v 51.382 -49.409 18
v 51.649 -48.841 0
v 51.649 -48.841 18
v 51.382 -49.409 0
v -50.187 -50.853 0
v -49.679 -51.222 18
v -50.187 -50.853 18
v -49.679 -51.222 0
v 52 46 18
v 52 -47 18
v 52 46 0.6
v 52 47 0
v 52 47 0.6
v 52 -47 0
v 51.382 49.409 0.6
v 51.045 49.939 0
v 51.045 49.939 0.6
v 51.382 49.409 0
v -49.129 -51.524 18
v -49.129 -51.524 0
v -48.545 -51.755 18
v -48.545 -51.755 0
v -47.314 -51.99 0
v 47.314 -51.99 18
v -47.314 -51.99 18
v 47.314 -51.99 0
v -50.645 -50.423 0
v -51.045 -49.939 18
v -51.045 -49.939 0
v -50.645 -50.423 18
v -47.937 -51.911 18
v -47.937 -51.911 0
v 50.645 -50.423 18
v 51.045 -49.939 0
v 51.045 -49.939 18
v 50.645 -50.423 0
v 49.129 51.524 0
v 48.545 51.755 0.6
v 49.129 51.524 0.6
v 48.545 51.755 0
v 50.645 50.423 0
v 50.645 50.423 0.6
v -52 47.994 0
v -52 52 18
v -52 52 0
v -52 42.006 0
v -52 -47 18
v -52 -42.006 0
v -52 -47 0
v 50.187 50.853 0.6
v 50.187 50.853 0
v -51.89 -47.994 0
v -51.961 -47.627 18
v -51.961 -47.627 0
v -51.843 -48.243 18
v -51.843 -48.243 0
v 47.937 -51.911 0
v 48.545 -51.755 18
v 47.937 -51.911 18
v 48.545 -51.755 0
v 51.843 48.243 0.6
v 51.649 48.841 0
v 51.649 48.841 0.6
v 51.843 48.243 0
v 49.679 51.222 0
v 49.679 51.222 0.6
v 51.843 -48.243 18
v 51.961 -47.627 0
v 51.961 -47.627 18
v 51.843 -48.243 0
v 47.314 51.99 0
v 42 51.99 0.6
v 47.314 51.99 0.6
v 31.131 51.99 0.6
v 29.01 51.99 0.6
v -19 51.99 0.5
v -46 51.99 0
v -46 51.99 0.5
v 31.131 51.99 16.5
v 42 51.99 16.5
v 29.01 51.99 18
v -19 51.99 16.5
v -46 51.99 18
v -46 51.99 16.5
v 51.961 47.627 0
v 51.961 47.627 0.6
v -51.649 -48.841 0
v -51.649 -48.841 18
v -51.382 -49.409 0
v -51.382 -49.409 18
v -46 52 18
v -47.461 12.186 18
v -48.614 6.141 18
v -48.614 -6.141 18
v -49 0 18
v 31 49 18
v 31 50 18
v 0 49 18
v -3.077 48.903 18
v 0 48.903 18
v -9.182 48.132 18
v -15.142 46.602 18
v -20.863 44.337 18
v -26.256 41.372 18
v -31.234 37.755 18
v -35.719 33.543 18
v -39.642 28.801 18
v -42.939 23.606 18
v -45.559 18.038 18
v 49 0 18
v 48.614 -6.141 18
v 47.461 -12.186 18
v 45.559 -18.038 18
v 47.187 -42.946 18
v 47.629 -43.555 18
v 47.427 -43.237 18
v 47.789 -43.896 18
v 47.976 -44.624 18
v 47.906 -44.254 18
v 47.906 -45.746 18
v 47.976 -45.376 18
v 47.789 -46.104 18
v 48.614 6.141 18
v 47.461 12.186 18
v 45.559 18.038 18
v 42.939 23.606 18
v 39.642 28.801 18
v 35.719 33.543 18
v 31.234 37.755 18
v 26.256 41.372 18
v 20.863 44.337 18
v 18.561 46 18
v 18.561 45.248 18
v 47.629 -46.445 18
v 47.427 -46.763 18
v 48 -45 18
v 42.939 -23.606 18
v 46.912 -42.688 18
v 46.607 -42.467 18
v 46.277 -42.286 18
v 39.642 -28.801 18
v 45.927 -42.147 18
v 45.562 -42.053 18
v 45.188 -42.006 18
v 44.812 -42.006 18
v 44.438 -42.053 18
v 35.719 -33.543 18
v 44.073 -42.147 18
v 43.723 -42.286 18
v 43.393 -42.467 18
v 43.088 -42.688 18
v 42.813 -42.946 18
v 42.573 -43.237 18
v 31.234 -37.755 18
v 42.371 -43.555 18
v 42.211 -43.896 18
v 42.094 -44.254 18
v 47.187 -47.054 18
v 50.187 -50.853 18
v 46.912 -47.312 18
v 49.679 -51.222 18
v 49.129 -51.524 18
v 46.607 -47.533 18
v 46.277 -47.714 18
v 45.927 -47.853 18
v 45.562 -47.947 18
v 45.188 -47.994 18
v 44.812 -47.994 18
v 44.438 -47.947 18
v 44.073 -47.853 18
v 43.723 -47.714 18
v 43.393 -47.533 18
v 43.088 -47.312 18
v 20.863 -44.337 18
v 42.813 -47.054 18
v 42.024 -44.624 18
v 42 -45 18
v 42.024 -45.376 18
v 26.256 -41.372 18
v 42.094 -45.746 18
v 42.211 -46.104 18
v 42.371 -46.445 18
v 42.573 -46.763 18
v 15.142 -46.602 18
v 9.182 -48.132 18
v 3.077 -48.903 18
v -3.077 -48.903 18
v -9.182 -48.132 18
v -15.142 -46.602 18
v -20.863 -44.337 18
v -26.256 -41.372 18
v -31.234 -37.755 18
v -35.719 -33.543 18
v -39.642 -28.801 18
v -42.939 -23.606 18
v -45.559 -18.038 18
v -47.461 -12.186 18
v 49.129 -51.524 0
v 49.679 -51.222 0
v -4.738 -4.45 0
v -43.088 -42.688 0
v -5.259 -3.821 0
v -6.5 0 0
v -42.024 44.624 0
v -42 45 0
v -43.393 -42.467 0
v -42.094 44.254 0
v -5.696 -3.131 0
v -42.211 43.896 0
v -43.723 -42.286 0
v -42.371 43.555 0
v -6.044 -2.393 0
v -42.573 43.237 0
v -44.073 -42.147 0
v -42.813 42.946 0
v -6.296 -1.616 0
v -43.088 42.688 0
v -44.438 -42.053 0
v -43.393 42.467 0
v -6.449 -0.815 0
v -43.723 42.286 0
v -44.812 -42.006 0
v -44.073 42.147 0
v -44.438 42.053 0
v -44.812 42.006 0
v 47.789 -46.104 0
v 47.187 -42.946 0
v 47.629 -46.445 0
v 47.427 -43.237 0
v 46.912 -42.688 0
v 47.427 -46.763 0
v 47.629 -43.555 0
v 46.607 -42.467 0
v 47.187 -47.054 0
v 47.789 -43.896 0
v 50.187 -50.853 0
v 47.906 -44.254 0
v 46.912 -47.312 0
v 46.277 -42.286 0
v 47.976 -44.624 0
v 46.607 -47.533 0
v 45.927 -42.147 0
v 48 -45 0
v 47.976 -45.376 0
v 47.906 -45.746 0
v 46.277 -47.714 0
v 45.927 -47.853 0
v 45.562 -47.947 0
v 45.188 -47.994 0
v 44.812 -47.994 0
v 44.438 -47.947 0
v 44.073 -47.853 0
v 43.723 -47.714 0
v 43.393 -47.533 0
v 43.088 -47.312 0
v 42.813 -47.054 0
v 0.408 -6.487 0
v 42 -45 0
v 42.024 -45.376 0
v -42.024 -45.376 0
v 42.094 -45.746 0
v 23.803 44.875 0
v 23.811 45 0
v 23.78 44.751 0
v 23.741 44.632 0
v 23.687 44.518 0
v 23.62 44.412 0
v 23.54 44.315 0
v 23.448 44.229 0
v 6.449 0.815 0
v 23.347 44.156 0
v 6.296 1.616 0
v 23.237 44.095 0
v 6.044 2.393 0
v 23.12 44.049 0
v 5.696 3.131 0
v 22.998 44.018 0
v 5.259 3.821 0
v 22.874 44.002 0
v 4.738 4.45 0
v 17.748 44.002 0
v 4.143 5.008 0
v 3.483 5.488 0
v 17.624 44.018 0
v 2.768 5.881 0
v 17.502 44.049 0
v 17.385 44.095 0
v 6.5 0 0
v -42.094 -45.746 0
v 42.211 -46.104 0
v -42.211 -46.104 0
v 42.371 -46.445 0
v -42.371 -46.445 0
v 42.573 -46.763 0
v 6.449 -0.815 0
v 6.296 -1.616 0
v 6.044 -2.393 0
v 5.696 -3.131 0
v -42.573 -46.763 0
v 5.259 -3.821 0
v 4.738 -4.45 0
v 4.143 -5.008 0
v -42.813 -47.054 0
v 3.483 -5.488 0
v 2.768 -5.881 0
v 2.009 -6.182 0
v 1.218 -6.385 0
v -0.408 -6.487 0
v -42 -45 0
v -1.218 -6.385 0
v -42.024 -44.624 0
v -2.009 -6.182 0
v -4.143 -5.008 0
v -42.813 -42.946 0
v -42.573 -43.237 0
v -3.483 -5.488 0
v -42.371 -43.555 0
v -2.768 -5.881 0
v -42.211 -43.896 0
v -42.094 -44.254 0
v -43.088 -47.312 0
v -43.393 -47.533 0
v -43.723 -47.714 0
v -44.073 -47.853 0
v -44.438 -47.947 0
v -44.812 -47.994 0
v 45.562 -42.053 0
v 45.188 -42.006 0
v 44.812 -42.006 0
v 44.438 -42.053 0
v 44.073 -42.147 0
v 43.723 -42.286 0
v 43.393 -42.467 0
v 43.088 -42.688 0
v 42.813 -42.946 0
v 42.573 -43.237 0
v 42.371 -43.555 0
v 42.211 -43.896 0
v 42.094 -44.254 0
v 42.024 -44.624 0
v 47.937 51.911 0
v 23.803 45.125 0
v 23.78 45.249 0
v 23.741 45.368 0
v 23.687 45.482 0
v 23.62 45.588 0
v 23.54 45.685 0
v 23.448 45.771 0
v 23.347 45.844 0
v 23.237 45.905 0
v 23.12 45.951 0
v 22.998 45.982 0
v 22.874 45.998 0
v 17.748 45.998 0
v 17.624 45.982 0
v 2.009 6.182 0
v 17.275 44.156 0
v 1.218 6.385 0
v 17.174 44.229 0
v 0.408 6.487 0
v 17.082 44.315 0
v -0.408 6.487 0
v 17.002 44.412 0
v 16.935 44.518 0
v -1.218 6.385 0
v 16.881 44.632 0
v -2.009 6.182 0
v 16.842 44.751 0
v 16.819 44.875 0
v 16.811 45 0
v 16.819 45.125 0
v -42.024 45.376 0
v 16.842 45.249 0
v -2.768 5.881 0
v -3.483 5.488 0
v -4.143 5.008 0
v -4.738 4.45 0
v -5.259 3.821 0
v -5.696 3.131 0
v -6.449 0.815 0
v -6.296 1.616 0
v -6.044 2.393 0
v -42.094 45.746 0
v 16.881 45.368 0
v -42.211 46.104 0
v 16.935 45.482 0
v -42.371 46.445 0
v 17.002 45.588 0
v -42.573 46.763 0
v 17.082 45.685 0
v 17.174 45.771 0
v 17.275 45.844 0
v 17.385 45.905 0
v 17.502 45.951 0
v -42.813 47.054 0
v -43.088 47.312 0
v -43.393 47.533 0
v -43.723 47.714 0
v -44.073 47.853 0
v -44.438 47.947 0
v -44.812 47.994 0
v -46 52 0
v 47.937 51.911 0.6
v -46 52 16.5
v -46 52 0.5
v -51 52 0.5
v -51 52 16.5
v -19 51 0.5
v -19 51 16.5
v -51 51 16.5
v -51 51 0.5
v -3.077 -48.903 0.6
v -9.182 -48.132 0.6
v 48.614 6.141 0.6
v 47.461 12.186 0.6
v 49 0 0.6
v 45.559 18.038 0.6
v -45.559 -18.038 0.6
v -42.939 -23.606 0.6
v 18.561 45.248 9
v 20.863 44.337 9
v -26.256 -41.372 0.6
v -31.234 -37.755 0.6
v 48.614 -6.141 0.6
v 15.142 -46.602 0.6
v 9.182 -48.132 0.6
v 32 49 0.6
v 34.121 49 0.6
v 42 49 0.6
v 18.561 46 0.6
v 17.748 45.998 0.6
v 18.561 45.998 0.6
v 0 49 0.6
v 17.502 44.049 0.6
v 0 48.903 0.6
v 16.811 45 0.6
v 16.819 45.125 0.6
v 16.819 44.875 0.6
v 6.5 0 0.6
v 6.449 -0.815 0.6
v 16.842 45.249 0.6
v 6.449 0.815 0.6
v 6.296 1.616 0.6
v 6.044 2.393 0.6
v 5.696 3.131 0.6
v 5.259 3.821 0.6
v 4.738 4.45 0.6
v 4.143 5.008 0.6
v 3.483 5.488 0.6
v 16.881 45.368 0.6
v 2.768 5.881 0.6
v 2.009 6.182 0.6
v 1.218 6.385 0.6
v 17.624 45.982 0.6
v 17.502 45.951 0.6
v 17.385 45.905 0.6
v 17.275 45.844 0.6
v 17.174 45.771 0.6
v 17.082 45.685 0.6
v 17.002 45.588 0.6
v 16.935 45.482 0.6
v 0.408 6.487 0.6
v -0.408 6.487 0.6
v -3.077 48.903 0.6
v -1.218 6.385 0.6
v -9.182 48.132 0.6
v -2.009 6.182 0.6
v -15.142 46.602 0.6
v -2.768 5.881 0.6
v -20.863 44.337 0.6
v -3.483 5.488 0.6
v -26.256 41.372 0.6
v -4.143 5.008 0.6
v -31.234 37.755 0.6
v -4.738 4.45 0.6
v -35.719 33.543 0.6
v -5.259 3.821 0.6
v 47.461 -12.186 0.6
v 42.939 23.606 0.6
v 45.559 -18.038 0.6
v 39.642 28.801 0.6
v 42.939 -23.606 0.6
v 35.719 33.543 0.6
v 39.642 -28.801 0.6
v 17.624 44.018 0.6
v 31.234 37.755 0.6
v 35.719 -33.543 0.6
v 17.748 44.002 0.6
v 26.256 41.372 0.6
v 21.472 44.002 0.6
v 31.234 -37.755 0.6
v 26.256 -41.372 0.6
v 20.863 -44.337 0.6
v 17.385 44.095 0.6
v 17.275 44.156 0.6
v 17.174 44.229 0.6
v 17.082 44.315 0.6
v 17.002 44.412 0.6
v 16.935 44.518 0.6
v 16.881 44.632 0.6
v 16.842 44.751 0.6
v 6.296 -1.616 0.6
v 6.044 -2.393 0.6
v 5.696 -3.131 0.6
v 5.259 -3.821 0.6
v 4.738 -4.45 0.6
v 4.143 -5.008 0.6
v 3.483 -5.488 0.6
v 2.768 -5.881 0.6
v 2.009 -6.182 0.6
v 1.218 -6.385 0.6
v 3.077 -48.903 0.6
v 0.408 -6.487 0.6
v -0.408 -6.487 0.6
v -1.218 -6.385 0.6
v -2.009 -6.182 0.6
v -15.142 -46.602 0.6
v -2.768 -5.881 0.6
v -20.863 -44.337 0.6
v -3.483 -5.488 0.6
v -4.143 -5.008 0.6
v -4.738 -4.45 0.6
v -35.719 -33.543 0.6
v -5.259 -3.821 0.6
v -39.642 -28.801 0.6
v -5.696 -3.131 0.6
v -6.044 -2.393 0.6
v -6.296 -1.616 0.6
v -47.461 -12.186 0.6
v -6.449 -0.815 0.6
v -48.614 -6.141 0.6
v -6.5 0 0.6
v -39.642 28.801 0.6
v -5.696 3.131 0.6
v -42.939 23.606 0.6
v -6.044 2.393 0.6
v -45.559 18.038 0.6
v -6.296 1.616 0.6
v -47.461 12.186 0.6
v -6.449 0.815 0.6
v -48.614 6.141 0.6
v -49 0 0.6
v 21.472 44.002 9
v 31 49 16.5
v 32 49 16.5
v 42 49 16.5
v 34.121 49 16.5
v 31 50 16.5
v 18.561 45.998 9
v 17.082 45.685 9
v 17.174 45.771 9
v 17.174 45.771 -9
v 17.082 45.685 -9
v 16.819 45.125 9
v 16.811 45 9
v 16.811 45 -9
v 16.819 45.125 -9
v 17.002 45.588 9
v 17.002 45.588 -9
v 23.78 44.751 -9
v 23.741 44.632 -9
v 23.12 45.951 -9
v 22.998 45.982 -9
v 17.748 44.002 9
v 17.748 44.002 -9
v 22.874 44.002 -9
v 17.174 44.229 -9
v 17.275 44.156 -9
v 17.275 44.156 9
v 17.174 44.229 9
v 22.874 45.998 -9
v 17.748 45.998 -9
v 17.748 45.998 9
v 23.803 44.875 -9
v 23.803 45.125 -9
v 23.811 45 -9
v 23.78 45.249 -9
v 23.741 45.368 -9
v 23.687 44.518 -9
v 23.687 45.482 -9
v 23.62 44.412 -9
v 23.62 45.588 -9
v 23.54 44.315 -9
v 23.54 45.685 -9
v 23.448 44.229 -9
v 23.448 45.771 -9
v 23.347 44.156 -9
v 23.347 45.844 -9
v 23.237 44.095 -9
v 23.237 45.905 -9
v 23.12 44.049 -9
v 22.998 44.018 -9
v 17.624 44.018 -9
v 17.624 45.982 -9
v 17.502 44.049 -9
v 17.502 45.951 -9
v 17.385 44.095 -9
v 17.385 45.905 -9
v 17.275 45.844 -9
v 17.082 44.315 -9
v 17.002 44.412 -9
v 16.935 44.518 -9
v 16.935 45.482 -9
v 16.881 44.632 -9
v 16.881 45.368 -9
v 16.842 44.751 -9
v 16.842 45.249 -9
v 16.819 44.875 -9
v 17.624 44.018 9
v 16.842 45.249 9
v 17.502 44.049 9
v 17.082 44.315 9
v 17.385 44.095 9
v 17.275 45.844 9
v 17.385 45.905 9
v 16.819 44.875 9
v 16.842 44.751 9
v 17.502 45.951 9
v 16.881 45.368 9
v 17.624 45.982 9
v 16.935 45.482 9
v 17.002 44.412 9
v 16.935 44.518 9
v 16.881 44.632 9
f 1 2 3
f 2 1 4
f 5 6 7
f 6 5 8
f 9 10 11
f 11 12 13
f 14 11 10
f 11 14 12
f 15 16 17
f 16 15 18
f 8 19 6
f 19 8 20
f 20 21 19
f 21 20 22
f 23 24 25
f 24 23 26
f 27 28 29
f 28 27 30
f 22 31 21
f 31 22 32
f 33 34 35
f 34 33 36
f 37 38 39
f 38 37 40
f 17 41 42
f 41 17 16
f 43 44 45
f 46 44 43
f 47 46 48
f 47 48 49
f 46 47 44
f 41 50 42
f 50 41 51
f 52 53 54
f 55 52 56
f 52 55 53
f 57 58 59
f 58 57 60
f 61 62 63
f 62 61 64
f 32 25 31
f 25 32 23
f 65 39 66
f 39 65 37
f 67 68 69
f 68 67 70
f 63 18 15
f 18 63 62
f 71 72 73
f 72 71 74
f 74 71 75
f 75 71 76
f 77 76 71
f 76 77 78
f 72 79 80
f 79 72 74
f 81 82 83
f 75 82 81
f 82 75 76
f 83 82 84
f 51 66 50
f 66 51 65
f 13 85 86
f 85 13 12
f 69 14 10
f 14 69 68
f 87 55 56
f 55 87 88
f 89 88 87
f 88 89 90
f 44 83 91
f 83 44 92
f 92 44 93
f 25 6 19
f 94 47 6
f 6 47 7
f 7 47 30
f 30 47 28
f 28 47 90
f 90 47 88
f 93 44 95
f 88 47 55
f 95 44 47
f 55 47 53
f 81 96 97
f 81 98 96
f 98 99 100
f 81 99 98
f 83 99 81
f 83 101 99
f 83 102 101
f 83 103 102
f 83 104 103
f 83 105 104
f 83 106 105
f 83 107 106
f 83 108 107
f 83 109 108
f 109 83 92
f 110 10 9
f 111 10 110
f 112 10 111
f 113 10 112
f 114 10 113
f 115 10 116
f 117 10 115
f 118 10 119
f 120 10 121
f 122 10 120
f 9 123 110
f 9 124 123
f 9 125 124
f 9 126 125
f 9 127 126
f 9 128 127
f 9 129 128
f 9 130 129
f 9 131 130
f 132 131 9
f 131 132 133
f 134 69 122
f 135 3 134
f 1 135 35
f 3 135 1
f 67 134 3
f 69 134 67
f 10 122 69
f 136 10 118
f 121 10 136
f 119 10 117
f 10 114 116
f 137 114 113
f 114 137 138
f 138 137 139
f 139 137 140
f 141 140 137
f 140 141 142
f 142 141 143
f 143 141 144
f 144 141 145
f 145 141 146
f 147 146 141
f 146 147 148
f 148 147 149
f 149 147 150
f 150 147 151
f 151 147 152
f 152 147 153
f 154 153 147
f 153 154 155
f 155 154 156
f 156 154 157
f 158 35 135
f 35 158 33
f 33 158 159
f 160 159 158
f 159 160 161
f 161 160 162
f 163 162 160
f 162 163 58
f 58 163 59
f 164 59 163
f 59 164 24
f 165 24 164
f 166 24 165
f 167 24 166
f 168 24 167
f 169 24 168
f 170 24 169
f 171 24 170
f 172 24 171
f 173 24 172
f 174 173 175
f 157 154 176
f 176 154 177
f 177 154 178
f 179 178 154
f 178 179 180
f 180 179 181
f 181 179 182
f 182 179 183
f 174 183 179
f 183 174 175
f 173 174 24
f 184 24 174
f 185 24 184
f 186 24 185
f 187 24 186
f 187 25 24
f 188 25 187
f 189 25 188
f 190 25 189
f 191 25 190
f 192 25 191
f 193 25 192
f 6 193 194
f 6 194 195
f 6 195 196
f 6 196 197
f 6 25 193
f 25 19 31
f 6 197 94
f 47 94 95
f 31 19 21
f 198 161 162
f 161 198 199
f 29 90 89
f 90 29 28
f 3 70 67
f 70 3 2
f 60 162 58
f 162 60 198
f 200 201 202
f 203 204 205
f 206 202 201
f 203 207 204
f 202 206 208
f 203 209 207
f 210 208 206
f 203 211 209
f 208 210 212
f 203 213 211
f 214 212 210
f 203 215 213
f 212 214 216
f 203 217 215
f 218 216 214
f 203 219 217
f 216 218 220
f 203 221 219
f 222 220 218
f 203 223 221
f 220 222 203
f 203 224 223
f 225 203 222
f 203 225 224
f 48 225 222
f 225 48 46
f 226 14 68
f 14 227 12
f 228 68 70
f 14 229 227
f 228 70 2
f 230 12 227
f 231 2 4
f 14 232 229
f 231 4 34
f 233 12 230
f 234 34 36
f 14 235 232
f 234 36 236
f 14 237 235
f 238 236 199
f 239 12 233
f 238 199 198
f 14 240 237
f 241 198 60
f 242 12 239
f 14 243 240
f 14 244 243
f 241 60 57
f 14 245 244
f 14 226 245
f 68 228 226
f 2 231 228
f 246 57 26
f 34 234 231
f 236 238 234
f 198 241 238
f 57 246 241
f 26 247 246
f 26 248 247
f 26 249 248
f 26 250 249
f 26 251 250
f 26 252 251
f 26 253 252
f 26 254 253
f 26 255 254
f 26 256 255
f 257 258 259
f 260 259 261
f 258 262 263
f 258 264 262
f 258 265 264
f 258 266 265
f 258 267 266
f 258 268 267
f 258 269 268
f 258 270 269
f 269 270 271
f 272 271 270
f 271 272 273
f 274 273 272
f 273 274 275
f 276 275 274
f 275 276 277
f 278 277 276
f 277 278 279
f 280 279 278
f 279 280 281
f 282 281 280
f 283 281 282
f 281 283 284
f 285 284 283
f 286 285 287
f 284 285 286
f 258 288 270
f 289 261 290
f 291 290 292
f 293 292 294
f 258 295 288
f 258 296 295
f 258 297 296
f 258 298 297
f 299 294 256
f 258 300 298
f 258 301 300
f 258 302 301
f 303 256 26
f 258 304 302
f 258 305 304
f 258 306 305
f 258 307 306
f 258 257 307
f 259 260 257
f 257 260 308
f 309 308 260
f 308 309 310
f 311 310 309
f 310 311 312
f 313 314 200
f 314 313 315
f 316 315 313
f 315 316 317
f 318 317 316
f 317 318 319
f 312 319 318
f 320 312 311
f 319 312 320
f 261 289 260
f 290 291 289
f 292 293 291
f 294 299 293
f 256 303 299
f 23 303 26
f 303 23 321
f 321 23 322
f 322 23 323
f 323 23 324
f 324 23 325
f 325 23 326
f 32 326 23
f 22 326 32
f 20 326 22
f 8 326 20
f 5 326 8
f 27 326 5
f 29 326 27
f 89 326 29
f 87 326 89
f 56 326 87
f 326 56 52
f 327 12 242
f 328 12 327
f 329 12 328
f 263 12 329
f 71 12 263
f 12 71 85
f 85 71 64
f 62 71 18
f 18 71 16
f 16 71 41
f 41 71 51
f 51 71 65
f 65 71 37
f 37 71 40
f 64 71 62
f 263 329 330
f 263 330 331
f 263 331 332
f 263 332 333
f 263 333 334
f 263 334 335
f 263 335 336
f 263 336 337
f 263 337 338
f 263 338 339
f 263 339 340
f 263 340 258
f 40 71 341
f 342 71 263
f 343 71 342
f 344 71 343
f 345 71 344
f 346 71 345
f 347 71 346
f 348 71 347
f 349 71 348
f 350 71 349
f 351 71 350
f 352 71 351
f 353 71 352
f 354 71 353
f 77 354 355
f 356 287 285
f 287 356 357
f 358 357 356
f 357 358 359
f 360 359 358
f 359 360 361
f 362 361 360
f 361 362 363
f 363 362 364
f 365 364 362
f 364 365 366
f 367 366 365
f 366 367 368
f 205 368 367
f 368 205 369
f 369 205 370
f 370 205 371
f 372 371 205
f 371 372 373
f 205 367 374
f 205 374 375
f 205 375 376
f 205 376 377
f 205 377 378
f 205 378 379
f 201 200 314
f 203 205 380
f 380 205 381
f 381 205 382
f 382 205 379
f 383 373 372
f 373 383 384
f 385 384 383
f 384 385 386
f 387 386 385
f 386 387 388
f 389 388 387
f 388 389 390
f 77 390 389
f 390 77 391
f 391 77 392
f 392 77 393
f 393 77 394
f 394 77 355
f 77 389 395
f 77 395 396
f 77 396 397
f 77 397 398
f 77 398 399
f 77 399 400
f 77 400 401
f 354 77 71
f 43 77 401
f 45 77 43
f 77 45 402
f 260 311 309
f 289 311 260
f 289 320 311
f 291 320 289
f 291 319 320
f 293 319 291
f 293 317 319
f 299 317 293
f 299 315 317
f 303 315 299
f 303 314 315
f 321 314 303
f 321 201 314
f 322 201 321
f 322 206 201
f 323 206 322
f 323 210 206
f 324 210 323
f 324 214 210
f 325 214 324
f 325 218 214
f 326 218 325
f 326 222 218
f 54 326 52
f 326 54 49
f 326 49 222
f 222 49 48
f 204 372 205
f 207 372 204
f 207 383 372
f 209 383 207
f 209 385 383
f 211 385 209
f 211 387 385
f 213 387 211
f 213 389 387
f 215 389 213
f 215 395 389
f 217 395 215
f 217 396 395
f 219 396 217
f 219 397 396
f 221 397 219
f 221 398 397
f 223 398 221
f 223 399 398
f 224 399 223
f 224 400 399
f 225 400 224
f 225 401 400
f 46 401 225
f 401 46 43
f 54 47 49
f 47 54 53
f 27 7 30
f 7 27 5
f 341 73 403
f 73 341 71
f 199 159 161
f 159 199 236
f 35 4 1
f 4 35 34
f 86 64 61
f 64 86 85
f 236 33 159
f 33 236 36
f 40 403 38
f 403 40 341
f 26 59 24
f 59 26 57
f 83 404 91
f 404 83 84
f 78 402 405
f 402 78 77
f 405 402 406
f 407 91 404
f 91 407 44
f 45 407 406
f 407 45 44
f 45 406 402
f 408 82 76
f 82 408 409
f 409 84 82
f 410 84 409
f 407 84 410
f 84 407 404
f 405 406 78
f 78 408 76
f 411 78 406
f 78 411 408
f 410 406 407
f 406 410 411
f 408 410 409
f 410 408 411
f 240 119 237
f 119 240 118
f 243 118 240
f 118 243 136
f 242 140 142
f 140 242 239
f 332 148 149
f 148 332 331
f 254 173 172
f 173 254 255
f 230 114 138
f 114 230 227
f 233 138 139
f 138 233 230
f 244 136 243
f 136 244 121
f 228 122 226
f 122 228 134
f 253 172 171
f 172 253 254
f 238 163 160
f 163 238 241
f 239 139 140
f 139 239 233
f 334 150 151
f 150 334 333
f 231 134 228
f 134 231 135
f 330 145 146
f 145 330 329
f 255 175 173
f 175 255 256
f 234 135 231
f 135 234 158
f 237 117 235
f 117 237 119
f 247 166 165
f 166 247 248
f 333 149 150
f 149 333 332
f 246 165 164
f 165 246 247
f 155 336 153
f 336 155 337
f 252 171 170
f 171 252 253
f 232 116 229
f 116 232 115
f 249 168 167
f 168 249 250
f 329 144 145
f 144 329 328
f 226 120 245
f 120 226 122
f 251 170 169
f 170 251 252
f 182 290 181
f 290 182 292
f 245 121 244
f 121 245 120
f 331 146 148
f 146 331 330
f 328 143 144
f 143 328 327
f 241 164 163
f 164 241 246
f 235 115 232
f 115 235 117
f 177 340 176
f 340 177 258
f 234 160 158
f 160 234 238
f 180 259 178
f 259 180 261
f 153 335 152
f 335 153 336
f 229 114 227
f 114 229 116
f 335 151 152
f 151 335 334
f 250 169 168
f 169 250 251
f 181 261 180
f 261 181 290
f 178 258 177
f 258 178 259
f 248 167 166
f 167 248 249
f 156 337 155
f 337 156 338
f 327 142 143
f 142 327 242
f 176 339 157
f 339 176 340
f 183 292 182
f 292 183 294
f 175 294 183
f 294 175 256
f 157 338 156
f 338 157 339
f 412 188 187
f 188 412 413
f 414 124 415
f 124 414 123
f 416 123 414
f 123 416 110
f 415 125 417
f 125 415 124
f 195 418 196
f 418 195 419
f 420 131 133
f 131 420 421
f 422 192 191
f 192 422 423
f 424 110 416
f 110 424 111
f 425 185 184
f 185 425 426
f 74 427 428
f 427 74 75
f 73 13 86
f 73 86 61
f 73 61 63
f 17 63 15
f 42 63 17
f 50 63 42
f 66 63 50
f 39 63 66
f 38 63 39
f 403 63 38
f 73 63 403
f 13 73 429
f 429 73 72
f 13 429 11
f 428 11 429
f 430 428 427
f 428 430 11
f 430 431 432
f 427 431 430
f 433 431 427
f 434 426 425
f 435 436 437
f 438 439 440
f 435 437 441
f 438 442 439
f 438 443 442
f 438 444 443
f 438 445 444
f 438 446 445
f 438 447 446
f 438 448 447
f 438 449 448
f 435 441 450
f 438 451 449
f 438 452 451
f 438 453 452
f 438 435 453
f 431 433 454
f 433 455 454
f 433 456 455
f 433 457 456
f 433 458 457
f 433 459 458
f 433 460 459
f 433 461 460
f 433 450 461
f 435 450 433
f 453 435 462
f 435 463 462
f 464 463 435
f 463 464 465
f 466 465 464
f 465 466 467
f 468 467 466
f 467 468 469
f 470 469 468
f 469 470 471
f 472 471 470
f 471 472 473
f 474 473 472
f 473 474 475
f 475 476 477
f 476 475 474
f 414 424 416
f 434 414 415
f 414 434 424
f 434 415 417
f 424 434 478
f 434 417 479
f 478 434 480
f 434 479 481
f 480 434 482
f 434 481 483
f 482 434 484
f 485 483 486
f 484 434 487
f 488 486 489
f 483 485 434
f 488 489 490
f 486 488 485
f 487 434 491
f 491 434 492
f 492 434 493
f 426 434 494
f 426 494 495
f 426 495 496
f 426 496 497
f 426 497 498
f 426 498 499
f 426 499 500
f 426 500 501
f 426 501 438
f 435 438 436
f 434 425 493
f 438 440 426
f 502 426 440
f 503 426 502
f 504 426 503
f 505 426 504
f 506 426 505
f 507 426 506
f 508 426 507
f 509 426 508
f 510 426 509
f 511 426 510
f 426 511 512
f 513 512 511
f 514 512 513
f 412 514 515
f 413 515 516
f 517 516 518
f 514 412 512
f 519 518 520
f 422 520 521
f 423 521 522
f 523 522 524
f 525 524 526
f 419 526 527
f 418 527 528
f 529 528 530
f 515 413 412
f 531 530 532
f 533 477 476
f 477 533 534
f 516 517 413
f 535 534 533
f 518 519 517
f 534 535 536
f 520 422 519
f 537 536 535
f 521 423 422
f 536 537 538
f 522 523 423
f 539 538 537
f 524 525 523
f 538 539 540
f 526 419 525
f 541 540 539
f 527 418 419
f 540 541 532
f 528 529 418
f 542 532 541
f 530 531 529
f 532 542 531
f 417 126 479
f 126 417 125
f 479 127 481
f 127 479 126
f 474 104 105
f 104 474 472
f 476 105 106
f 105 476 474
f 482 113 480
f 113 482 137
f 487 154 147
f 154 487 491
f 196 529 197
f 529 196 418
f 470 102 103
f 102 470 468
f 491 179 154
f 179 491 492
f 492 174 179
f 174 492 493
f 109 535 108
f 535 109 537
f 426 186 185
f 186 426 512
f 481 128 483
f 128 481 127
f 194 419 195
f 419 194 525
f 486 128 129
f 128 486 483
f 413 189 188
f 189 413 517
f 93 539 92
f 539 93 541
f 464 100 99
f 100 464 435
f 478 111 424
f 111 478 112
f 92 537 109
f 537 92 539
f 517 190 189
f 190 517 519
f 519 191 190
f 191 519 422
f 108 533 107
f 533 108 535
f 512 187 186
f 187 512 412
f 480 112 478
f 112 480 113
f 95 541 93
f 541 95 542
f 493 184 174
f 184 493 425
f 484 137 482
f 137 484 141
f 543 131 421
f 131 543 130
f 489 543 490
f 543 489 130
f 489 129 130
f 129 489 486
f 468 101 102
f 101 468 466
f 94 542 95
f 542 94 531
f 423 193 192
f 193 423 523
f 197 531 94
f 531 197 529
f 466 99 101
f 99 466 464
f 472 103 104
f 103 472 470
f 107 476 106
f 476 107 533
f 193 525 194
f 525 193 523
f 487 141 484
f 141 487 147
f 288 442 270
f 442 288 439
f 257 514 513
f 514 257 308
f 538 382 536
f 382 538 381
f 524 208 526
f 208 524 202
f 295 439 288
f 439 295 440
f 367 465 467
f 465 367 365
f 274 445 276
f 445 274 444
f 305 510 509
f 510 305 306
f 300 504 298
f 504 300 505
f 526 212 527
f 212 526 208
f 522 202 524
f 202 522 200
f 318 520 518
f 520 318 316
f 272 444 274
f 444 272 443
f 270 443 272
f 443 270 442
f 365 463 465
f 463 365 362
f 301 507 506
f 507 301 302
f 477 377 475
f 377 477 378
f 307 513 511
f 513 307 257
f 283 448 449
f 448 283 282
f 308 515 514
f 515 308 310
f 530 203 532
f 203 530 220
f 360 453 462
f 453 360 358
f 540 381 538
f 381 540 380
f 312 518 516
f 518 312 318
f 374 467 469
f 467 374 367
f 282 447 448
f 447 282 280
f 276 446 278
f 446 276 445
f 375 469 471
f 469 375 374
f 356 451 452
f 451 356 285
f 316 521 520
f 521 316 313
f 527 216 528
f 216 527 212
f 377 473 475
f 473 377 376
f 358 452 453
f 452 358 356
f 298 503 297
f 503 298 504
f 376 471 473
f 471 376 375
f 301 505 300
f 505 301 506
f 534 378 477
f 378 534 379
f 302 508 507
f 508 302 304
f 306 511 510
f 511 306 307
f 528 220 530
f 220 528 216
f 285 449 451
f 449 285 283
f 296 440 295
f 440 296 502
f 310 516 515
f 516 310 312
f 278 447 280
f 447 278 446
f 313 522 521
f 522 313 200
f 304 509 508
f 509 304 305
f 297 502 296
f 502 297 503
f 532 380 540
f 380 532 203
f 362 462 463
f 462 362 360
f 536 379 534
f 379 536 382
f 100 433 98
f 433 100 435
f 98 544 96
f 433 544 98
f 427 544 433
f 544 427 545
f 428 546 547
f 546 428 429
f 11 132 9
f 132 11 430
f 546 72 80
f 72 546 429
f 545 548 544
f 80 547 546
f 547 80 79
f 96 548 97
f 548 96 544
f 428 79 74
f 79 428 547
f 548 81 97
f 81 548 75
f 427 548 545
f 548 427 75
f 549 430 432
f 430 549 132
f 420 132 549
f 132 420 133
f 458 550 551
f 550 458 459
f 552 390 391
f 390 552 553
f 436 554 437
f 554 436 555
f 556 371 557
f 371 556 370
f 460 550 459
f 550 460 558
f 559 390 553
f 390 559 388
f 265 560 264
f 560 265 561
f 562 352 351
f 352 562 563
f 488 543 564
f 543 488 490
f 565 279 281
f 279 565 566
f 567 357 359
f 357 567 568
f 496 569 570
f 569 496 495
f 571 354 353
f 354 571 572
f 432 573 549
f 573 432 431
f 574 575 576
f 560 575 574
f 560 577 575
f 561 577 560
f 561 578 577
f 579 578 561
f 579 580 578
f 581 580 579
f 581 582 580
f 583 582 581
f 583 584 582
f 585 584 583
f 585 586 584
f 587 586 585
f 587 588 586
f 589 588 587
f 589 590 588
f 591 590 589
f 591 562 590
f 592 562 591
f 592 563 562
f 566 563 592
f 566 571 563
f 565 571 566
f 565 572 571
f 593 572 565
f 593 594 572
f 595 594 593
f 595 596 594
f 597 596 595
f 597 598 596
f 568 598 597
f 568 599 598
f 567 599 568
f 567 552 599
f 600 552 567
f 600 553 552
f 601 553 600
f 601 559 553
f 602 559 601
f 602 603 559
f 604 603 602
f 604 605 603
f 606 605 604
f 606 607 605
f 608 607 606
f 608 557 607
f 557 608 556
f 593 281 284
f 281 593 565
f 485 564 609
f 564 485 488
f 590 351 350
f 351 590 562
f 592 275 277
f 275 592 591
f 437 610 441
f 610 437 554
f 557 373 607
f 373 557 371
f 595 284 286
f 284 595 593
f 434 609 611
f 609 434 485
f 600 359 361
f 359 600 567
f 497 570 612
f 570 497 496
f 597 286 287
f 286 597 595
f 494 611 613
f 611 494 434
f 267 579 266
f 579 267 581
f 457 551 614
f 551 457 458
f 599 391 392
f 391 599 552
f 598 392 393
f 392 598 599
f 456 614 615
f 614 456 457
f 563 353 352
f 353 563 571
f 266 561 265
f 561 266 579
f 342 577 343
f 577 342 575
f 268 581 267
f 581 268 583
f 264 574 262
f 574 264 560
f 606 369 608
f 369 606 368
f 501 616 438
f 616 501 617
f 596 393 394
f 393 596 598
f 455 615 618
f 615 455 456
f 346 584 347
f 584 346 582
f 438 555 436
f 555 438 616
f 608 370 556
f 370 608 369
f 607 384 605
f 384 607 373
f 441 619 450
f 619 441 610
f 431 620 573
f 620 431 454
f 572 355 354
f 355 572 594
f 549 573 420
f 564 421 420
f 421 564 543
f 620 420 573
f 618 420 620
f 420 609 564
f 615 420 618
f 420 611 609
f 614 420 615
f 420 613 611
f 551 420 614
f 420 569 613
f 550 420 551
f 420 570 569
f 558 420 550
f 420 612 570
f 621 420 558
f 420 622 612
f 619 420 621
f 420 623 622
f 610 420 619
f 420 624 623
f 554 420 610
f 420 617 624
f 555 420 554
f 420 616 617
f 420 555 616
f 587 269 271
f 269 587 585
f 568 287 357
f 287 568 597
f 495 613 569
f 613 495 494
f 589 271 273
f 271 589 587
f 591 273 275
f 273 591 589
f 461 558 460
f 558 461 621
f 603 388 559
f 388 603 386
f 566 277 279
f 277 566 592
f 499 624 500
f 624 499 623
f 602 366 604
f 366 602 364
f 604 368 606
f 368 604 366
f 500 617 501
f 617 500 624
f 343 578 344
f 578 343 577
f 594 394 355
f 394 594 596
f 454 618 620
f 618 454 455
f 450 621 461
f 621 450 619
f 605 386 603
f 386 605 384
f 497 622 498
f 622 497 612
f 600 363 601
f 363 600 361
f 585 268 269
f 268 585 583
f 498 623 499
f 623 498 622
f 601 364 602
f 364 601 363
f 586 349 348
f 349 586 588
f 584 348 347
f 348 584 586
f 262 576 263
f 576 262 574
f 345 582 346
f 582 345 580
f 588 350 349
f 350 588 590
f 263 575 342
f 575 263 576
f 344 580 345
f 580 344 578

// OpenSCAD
$fn = 50;


union() {
	difference() {
		union() {
			hull() {
				translate(v = [-47.0000000000, 47.0000000000, 0]) {
					cylinder(h = 18, r = 5);
				}
				translate(v = [47.0000000000, 47.0000000000, 0]) {
					cylinder(h = 18, r = 5);
				}
				translate(v = [-47.0000000000, -47.0000000000, 0]) {
					cylinder(h = 18, r = 5);
				}
				translate(v = [47.0000000000, -47.0000000000, 0]) {
					cylinder(h = 18, r = 5);
				}
			}
			translate(v = [-52.0000000000, 46.0000000000, 0]) {
				cube(size = [6, 6, 18]);
			}
		}
		union() {
			translate(v = [-52.5000000000, -45.0000000000, -250.0000000000]) {
				rotate(a = [0, 0, 0]) {
					difference() {
						union() {
							hull() {
								translate(v = [7.5000000000, 0, 0]) {
									cylinder(h = 250, r = 3.0000000000, r1 = 3.0000000000, r2 = 3.0000000000);
								}
								translate(v = [-7.5000000000, 0, 0]) {
									cylinder(h = 250, r = 3.0000000000, r1 = 3.0000000000, r2 = 3.0000000000);
								}
							}
						}
						union();
					}
				}
			}
			translate(v = [-52.5000000000, 45.0000000000, -250.0000000000]) {
				rotate(a = [0, 0, 0]) {
					difference() {
						union() {
							hull() {
								translate(v = [7.5000000000, 0, 0]) {
									cylinder(h = 250, r = 3.0000000000, r1 = 3.0000000000, r2 = 3.0000000000);
								}
								translate(v = [-7.5000000000, 0, 0]) {
									cylinder(h = 250, r = 3.0000000000, r1 = 3.0000000000, r2 = 3.0000000000);
								}
							}
						}
						union();
					}
				}
			}
			translate(v = [-51.0000000000, 51.0000000000, 0.5000000000]) {
				cube(size = [32, 1, 16]);
			}
			translate(v = [45.0000000000, -45.0000000000, 0]) {
				cylinder(h = 100, r = 3.0000000000);
			}
			translate(v = [0, 0, 0.6000000000]) {
				cylinder(h = 20.4000000000, r = 49.0000000000);
			}
			translate(v = [0, 0, -9.0000000000]) {
				cylinder(h = 18, r = 6.5000000000);
			}
			translate(v = [0.0000000000, 46.0000000000, 0.6000000000]) {
				cube(size = [52.0000000000, 3, 20.4000000000]);
			}
			translate(v = [42.0000000000, 46.0000000000, 0.6000000000]) {
				cube(size = [10, 6, 20.4000000000]);
			}
			translate(v = [31.0000000000, 46.0000000000, 16.5000000000]) {
				cube(size = [21, 6, 1.5000000000]);
			}
			translate(v = [28.2500000000, 52.7500000000, 0.6000000000]) {
				rotate(a = [0, 0, -45]) {
					cube(size = [7.5000000000, 1.5000000000, 20.4000000000]);
				}
			}
			translate(v = [11.0610000000, 44.0000000000, 0.6000000000]) {
				cube(size = [7.5000000000, 2, 17.4000000000]);
			}
		}
	}
	union() {
		translate(v = [20.3110000000, 45.0000000000, -9.0000000000]) {
			rotate(a = [0, 0, 0]) {
				difference() {
					union() {
						#hull() {
							#translate(v = [2.5000000000, 0, 0]) {
								cylinder(h = 18, r = 1.0000000000, r1 = 1.0000000000, r2 = 1.0000000000);
							}
							#translate(v = [-2.5000000000, 0, 0]) {
								cylinder(h = 18, r = 1.0000000000, r1 = 1.0000000000, r2 = 1.0000000000);
							}
						}
					}
					union();
				}
			}
		}
	}
}
